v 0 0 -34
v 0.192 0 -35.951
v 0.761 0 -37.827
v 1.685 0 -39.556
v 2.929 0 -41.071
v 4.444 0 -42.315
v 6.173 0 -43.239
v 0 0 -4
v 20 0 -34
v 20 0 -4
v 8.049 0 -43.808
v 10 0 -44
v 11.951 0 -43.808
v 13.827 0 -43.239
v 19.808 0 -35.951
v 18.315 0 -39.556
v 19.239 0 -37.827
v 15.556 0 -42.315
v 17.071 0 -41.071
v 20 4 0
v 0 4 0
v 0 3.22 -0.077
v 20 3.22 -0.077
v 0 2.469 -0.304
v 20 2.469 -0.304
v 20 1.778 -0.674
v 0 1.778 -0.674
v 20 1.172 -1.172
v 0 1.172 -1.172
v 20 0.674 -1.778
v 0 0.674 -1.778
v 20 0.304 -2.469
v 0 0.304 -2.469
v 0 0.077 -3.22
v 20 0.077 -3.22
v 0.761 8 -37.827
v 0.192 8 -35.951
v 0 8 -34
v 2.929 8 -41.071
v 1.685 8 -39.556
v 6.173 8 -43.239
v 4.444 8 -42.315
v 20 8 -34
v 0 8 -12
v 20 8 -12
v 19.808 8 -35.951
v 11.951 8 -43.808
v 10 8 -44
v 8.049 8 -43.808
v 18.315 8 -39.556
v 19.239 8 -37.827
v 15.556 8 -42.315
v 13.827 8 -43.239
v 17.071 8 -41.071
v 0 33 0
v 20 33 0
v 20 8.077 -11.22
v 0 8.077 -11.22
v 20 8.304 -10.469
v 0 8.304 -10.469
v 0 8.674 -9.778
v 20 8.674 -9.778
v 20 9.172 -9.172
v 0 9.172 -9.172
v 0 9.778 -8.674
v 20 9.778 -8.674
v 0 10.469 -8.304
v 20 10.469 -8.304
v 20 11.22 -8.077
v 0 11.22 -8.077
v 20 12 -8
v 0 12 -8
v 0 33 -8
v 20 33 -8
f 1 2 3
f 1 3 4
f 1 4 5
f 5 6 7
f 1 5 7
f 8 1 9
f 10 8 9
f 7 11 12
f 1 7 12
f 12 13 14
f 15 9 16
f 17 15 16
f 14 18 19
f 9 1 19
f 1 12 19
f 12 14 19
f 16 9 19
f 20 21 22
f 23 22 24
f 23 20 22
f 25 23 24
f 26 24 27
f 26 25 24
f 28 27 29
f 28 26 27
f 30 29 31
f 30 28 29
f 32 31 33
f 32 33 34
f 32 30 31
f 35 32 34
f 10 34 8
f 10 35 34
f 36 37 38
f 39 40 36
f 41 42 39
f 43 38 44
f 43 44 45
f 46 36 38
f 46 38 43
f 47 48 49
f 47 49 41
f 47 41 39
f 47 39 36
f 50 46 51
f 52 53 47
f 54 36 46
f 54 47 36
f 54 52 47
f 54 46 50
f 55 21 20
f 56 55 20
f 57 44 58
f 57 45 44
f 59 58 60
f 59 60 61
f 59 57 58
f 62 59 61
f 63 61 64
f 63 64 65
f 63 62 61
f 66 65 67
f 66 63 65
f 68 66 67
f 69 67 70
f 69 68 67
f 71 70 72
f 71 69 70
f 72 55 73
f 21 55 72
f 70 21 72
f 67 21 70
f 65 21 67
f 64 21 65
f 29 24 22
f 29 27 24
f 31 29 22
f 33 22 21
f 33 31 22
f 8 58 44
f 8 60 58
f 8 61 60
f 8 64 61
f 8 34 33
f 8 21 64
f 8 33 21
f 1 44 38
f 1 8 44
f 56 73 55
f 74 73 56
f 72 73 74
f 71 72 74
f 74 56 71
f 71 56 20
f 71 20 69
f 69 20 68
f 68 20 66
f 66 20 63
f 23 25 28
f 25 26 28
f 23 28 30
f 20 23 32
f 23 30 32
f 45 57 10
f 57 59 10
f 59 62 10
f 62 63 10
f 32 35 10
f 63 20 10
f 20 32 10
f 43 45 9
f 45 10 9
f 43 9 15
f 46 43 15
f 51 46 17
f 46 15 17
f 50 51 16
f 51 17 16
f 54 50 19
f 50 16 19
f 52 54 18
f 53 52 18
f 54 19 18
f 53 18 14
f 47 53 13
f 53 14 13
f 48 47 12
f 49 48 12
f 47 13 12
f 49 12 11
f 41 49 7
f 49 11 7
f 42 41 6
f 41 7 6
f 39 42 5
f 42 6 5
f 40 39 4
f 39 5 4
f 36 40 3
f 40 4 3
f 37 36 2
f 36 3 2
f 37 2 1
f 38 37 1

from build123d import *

# Parameters (mm, degrees)
RESSALTO_EXTRUS_O1_DEPTH = 8
ESBO_O2_W                = 20
ESBO_O2_H                = 8
RESSALTO_EXTRUS_O2_DEPTH = 25
FILETE1_R                = 4


with BuildPart() as part:
    # Esboço1 → Ressalto-extrusão1 (new body)
    with BuildSketch(Plane(origin=(0, 0, 0), x_dir=(1, 0, 0), z_dir=(0, 1, 0))):
        with BuildLine():
            Line((0, 0), (20, 0))
            Line((20, 0), (20, 34))
            ThreePointArc((20, 34), (10, 44), (0, 34))
            Line((0, 34), (0, 0))
        make_face()
    extrude(amount=RESSALTO_EXTRUS_O1_DEPTH)

    # Esboço2 → Ressalto-extrusão2 (add)
    with BuildSketch(Plane(origin=(0, 8, 0), x_dir=(1, 0, 0), z_dir=(0, 1, 0))):
        with Locations((10, 4)):
            Rectangle(ESBO_O2_W, ESBO_O2_H)
    extrude(amount=RESSALTO_EXTRUS_O2_DEPTH)

    # Filete1
    filete1_edges = [part.edges().sort_by_distance(p)[0] for p in [
        (10, 8, -8),
        (10, 0, 0),
    ]]
    fillet(filete1_edges, radius=FILETE1_R)


solid = part.part
